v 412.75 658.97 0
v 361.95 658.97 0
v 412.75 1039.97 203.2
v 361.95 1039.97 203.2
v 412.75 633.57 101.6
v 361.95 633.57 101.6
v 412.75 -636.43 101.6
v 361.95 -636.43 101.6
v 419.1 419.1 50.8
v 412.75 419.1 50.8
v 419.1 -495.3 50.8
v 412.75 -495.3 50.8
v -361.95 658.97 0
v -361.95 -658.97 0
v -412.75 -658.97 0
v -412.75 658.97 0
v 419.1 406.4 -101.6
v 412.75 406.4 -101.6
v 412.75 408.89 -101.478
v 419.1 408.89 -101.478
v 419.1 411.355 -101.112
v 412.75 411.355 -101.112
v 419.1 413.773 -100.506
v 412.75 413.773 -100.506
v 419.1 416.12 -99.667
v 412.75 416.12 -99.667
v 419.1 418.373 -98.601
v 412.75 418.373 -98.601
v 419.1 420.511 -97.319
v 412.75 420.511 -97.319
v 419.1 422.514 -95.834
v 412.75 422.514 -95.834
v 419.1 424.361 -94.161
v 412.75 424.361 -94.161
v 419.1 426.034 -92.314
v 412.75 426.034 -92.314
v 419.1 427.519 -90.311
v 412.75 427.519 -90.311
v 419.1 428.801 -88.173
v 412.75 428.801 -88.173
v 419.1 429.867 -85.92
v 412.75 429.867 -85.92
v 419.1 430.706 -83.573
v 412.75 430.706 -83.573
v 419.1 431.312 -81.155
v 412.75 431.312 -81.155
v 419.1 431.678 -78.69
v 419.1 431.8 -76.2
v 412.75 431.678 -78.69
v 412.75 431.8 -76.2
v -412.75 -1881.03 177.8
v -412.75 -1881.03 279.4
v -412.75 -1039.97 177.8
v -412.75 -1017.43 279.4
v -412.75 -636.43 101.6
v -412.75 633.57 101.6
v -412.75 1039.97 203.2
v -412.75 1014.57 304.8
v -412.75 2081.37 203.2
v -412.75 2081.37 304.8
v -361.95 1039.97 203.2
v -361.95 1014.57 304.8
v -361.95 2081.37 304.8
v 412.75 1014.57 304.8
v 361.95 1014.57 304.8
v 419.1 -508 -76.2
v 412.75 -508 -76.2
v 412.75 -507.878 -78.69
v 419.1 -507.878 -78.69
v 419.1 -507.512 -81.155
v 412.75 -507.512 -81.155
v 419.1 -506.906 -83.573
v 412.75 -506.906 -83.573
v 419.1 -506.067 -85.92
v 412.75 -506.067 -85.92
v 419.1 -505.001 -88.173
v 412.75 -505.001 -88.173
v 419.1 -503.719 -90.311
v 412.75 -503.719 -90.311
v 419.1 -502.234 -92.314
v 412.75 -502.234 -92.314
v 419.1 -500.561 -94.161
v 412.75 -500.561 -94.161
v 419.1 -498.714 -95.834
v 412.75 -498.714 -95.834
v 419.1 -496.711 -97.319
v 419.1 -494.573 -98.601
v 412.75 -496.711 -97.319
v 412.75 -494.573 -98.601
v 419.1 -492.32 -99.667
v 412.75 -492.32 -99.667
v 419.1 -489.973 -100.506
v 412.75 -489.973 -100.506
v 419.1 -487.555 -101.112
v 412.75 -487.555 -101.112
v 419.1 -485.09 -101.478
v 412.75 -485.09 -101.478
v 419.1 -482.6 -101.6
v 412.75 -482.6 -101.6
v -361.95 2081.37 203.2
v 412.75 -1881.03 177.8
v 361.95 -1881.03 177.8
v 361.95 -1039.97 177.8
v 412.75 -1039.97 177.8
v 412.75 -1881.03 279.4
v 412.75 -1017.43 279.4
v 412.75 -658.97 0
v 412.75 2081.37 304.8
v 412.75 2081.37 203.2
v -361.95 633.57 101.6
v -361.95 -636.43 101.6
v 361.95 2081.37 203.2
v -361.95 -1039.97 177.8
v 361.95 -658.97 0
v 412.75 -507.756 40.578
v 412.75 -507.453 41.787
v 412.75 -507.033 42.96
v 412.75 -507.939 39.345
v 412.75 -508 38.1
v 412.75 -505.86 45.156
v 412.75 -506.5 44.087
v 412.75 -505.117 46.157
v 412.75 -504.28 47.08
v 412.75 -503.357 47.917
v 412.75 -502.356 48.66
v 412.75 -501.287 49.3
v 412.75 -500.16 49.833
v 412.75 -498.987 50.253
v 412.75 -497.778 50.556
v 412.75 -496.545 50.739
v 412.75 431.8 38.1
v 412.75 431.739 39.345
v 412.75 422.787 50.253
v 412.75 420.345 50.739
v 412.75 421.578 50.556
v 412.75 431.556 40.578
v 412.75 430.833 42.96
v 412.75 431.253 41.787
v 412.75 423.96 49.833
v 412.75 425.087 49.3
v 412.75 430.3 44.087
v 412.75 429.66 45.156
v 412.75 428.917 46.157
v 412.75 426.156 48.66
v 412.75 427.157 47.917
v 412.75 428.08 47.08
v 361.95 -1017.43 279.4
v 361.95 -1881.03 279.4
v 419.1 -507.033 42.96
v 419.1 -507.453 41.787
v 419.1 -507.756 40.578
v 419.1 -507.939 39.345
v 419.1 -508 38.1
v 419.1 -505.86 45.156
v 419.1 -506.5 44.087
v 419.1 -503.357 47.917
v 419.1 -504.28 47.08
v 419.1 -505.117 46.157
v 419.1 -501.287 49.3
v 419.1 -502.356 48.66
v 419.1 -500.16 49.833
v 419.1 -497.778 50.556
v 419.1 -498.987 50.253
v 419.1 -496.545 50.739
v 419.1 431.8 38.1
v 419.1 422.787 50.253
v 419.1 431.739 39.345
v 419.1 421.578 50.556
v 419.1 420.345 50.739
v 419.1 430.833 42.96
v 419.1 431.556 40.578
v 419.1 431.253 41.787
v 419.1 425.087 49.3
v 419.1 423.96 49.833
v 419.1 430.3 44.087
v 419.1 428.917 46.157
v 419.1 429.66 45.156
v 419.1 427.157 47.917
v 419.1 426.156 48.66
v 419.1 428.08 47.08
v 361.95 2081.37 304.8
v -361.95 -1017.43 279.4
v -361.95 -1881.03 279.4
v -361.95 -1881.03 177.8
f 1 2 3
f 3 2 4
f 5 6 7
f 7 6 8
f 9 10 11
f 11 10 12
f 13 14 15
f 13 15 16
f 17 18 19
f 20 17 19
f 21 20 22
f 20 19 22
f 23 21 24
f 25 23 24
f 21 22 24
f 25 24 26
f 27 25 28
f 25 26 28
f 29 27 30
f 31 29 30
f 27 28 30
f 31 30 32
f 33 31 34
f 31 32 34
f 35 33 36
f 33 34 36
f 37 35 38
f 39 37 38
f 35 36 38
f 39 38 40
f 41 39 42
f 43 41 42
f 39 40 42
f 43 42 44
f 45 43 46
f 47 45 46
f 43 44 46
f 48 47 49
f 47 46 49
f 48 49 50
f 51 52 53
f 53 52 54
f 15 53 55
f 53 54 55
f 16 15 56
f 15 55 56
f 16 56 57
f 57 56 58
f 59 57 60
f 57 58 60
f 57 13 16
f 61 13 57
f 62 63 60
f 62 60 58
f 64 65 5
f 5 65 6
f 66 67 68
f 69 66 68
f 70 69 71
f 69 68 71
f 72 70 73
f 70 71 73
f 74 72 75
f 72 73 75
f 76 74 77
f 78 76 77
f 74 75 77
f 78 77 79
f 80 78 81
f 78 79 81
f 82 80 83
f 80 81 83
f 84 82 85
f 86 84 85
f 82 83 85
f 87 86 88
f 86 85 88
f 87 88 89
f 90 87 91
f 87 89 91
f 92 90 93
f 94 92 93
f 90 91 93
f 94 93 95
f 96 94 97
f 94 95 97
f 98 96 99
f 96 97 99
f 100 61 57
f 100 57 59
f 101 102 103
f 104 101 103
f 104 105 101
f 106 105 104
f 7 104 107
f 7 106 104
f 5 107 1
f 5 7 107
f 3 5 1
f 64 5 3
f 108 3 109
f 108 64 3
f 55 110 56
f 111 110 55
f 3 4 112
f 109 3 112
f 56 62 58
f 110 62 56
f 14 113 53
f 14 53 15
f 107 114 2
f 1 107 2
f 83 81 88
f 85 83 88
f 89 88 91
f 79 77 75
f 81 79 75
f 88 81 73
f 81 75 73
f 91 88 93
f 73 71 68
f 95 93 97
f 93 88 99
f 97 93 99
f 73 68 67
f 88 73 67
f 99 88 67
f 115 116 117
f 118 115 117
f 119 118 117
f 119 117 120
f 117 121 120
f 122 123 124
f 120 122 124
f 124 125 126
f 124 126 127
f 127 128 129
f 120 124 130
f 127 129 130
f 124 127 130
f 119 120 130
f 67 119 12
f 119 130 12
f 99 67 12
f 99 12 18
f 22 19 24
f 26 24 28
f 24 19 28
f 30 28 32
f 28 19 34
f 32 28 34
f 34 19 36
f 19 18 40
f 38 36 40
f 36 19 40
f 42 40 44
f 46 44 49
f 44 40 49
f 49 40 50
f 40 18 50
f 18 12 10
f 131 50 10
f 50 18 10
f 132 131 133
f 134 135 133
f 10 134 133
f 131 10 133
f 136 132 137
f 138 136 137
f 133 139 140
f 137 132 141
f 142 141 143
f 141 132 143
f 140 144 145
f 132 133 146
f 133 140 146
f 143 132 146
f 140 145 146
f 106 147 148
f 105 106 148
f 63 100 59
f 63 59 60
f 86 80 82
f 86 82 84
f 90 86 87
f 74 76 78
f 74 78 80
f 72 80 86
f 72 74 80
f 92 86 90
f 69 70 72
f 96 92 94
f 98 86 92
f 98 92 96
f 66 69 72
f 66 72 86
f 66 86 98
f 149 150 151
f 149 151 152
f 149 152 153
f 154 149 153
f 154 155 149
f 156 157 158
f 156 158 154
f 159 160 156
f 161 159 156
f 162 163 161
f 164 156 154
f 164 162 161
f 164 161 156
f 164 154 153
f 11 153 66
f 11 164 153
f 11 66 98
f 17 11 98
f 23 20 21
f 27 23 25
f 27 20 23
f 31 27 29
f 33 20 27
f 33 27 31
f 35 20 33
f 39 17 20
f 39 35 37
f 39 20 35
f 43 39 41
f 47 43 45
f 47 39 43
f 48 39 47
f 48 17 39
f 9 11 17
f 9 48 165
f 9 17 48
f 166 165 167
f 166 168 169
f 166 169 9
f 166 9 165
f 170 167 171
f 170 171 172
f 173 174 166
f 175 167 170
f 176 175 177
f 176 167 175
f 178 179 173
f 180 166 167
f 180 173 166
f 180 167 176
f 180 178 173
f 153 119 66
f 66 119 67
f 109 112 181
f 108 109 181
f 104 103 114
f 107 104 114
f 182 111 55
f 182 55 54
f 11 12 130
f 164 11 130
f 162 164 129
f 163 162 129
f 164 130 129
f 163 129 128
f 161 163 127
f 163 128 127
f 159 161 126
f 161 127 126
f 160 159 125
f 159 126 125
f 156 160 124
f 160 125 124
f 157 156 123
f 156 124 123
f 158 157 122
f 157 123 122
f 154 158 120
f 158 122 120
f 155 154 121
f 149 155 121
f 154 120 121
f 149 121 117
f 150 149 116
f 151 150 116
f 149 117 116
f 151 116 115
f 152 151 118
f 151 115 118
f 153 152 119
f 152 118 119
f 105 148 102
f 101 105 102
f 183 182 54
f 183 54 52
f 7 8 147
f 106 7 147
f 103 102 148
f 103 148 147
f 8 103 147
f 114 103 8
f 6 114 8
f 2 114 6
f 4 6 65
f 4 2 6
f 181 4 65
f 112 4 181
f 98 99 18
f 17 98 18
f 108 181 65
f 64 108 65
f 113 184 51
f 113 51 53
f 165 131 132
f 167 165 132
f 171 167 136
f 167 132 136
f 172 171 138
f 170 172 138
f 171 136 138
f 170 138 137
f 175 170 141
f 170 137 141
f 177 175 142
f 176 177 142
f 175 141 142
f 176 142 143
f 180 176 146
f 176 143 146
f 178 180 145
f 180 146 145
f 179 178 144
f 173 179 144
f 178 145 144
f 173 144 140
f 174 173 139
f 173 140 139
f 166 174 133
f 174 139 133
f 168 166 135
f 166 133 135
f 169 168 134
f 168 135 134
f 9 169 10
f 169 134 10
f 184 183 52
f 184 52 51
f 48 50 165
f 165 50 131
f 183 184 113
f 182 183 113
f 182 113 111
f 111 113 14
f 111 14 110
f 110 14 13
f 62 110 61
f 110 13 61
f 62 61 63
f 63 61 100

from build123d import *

# Parameters (mm, degrees)
F1_DEPTH = 412.75
F2_W     = 361.95
F2_H     = 4318
F3_DEPTH = 101.601
F4_DEPTH = 203.201
F7_DEPTH = 6.35


# Not quite as in the source:
# - a feature names something its author has since deleted; it is built from what else it names


with BuildPart() as f1:
    # F0 (on Right) → F1 (new body)
    with BuildSketch(Plane.YZ):
        Polygon((-1017.4300536931, 279.4), (-1881.0300536931, 279.4), (-1881.0300536931, 177.8), (-1039.9699463069, 177.8), (-658.9699463069, 0), (658.9699463069, 0), (1039.9699463069, 203.2), (2081.3699463069, 203.2), (2081.3699463069, 304.8), (1014.5699463069, 304.8), (633.5699463069, 101.6), (-636.4300536931, 101.6), align=None)
    extrude(amount=-F1_DEPTH)

    # F2 (on face) → F3 (cut, through all)
    with BuildSketch(Plane.XY.offset(101.6)):
        with Locations((-180.975, 0)):
            Rectangle(F2_W, F2_H)
    extrude(amount=-F3_DEPTH, mode=Mode.SUBTRACT)

    # F2 (on face) → F4 (cut, through all)
    with BuildSketch(Plane.XY.offset(101.6)):
        with Locations((-180.975, 0)):
            Rectangle(F2_W, F2_H)
    extrude(amount=F4_DEPTH, mode=Mode.SUBTRACT)


with BuildPart() as f5_1:
    # F5: instance of F1
    add(f1.part.mirror(Plane.YZ))


with BuildPart() as f7:
    # F6 (on face) → F7 (new body)
    with BuildSketch(Plane.YZ.offset(412.75)):
        with BuildLine():
            Line((419.1, 50.8), (-495.3, 50.8))
            ThreePointArc((-495.3, 50.8), (-504.2802561211, 47.0802561211), (-508, 38.1))
            Line((-508, 38.1), (-508, -76.2))
            ThreePointArc((-508, -76.2), (-500.5605122421, -94.1605122421), (-482.6, -101.6))
            Line((-482.6, -101.6), (406.4, -101.6))
            ThreePointArc((406.4, -101.6), (424.3605122421, -94.1605122421), (431.8, -76.2))
            Line((431.8, -76.2), (431.8, 38.1))
            ThreePointArc((431.8, 38.1), (428.0802561211, 47.0802561211), (419.1, 50.8))
        make_face()
    extrude(amount=F7_DEPTH)


solid = Compound([f1.part, f5_1.part, f7.part])
